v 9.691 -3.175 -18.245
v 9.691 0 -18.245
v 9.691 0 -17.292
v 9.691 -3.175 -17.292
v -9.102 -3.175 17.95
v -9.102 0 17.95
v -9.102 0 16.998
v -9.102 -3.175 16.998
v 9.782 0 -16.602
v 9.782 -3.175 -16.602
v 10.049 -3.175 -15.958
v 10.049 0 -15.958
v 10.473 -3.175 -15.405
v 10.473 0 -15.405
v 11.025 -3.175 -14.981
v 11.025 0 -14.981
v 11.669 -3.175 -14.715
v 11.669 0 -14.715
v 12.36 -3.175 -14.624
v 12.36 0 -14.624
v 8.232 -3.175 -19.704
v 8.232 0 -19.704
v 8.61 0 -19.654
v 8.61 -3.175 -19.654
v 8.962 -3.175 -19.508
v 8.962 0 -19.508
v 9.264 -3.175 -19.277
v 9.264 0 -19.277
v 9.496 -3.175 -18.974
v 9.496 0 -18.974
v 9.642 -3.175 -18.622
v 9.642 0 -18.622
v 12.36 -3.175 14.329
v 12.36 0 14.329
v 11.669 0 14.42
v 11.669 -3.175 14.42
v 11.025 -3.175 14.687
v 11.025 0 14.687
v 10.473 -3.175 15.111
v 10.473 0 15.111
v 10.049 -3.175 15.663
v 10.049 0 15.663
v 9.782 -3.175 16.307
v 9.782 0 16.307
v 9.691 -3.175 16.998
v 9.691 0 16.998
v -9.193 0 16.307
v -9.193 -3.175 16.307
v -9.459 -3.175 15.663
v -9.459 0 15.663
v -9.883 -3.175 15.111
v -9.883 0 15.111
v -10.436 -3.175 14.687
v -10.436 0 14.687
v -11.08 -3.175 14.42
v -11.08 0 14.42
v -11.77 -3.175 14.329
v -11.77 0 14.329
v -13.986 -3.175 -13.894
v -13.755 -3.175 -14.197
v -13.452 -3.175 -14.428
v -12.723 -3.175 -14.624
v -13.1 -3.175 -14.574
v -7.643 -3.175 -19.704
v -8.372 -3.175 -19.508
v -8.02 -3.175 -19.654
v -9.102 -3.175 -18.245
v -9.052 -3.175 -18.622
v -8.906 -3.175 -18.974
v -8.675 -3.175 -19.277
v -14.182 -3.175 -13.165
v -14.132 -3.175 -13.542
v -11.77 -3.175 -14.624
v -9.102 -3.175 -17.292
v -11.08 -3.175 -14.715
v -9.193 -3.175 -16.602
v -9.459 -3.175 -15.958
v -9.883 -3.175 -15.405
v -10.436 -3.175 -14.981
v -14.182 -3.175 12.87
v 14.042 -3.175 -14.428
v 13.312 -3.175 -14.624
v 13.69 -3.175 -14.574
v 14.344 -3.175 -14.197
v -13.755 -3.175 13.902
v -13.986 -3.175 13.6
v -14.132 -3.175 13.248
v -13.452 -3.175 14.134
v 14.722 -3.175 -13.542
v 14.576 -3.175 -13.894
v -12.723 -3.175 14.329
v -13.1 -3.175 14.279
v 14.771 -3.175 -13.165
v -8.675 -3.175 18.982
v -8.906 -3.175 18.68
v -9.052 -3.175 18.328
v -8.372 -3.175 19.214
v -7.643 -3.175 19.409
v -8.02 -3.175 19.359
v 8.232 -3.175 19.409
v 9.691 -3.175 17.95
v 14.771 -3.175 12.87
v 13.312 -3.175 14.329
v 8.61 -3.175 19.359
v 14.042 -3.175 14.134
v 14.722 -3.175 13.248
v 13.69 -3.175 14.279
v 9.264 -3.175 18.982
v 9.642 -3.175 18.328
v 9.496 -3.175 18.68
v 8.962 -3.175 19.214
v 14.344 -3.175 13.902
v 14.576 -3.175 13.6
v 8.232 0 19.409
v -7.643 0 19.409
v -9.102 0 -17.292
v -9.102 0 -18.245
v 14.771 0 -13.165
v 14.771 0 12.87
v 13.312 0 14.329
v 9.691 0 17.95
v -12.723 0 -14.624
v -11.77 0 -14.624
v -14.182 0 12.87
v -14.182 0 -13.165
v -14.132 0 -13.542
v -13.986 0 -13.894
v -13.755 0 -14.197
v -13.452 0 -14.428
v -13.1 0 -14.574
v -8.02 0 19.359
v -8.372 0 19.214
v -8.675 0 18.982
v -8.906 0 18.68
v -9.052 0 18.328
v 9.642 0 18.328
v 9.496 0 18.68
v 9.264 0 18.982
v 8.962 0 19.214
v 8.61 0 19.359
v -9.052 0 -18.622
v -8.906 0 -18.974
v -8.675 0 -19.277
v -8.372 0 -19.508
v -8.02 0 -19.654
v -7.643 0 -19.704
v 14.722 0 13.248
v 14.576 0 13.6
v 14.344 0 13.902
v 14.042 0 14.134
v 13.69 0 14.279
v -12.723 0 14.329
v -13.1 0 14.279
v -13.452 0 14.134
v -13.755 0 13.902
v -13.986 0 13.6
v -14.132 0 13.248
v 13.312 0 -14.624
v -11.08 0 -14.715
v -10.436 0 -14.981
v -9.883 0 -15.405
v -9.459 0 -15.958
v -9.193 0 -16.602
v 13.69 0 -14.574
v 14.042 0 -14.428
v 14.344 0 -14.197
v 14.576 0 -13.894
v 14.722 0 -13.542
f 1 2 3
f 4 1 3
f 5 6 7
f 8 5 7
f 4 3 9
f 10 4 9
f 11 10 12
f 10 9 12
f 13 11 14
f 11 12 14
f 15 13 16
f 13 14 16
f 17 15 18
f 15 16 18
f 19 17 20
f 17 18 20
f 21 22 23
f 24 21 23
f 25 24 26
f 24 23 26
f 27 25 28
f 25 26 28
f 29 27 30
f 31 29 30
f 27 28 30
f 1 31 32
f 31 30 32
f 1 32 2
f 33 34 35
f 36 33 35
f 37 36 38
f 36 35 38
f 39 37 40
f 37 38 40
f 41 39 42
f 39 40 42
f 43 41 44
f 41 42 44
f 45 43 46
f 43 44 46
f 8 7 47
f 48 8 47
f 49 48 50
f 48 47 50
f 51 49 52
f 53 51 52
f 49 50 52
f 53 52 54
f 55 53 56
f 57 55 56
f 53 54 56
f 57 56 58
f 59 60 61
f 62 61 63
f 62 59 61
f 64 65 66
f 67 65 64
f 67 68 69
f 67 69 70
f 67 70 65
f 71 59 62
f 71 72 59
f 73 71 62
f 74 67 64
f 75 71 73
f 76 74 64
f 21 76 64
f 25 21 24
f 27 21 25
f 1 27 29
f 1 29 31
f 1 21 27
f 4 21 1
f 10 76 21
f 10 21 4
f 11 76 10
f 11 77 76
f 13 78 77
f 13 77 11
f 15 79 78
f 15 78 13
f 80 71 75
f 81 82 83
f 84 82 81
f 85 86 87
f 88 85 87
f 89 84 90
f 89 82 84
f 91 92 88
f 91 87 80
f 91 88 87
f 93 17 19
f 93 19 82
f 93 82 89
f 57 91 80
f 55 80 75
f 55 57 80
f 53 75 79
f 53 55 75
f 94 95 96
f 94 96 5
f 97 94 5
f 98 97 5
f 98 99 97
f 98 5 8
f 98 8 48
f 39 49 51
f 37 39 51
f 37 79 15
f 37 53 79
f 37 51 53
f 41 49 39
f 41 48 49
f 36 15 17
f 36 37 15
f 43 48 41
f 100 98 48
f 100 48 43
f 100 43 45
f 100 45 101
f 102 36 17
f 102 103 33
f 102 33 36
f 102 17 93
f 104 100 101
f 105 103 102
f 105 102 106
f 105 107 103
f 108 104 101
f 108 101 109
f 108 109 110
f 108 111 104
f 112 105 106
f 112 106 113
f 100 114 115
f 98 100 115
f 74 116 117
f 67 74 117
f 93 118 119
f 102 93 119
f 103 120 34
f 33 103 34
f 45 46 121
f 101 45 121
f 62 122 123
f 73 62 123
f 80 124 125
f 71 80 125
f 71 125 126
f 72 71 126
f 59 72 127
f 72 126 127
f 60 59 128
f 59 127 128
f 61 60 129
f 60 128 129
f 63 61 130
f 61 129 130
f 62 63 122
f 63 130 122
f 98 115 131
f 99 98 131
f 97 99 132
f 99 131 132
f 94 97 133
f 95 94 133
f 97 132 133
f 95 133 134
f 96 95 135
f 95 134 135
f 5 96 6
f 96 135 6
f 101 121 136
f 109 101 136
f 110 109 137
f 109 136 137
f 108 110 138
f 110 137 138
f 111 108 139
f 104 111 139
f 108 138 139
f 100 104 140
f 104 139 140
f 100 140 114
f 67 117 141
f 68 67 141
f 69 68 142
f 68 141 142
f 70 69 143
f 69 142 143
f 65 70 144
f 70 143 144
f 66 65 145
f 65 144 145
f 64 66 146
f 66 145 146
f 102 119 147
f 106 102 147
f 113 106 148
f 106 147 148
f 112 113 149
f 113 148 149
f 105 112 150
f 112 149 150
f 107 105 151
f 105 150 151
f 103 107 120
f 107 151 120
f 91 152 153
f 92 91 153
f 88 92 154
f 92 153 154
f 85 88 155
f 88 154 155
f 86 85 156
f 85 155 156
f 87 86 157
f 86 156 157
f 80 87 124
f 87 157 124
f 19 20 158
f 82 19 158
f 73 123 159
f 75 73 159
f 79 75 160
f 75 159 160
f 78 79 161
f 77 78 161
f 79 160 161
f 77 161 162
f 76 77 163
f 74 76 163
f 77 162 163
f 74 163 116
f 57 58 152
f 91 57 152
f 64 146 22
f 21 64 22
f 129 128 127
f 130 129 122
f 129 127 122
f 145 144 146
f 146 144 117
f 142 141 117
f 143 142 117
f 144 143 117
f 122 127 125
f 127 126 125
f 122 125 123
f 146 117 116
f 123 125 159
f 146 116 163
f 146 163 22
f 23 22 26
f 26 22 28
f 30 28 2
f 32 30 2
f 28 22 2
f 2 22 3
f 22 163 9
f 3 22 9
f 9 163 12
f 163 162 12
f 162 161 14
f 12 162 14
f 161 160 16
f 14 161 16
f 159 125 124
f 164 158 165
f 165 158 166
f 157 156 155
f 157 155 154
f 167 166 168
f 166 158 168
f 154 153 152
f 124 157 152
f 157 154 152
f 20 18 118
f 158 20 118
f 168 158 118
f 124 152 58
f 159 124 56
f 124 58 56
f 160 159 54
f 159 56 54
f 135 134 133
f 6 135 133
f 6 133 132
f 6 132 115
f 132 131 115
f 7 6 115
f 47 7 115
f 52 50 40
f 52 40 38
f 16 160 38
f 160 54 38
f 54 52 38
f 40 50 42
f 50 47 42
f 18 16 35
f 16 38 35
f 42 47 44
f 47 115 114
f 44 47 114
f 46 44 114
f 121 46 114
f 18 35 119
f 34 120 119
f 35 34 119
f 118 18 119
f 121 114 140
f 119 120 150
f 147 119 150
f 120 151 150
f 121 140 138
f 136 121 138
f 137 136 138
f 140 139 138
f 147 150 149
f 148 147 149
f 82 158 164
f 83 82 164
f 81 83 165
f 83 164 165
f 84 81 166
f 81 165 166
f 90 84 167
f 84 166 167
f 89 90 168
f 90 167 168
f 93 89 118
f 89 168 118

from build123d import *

# Parameters (mm, degrees)
F1_DEPTH = 3.175


with BuildPart() as f1:
    # F0 (on Front) → F1 (new body)
    with BuildSketch(Plane.XZ):
        with BuildLine():
            Line((-11.770303, 14.329202), (-12.722803, 14.329202))
            ThreePointArc((-12.722803, 14.329202), (-13.754507, 13.901856), (-14.181852, 12.870152))
            Line((-14.181852, 12.870152), (-14.181852, -13.164848))
            ThreePointArc((-14.181852, -13.164848), (-13.754507, -14.196552), (-12.722803, -14.623898))
            Line((-12.722803, -14.623898), (-11.770303, -14.623898))
            ThreePointArc((-11.770303, -14.623898), (-9.883423, -15.405469), (-9.101852, -17.292348))
            Line((-9.101852, -17.292348), (-9.101852, -18.244848))
            ThreePointArc((-9.101852, -18.244848), (-8.674507, -19.276552), (-7.642803, -19.703898))
            Line((-7.642803, -19.703898), (8.232197, -19.703898))
            ThreePointArc((8.232197, -19.703898), (9.263901, -19.276552), (9.691247, -18.244848))
            Line((9.691247, -18.244848), (9.691247, -17.292348))
            ThreePointArc((9.691247, -17.292348), (10.472818, -15.405469), (12.359697, -14.623898))
            Line((12.359697, -14.623898), (13.312197, -14.623898))
            ThreePointArc((13.312197, -14.623898), (14.343901, -14.196552), (14.771247, -13.164848))
            Line((14.771247, -13.164848), (14.771247, 12.870152))
            ThreePointArc((14.771247, 12.870152), (14.343901, 13.901856), (13.312197, 14.329202))
            Line((13.312197, 14.329202), (12.359697, 14.329202))
            ThreePointArc((12.359697, 14.329202), (10.472818, 15.110773), (9.691247, 16.997652))
            Line((9.691247, 16.997652), (9.691247, 17.950152))
            ThreePointArc((9.691247, 17.950152), (9.263901, 18.981856), (8.232197, 19.409202))
            Line((8.232197, 19.409202), (-7.642803, 19.409202))
            ThreePointArc((-7.642803, 19.409202), (-8.674507, 18.981856), (-9.101852, 17.950152))
            Line((-9.101852, 17.950152), (-9.101852, 16.997652))
            ThreePointArc((-9.101852, 16.997652), (-9.883423, 15.110773), (-11.770303, 14.329202))
        make_face()
    extrude(amount=F1_DEPTH)


solid = f1.part
